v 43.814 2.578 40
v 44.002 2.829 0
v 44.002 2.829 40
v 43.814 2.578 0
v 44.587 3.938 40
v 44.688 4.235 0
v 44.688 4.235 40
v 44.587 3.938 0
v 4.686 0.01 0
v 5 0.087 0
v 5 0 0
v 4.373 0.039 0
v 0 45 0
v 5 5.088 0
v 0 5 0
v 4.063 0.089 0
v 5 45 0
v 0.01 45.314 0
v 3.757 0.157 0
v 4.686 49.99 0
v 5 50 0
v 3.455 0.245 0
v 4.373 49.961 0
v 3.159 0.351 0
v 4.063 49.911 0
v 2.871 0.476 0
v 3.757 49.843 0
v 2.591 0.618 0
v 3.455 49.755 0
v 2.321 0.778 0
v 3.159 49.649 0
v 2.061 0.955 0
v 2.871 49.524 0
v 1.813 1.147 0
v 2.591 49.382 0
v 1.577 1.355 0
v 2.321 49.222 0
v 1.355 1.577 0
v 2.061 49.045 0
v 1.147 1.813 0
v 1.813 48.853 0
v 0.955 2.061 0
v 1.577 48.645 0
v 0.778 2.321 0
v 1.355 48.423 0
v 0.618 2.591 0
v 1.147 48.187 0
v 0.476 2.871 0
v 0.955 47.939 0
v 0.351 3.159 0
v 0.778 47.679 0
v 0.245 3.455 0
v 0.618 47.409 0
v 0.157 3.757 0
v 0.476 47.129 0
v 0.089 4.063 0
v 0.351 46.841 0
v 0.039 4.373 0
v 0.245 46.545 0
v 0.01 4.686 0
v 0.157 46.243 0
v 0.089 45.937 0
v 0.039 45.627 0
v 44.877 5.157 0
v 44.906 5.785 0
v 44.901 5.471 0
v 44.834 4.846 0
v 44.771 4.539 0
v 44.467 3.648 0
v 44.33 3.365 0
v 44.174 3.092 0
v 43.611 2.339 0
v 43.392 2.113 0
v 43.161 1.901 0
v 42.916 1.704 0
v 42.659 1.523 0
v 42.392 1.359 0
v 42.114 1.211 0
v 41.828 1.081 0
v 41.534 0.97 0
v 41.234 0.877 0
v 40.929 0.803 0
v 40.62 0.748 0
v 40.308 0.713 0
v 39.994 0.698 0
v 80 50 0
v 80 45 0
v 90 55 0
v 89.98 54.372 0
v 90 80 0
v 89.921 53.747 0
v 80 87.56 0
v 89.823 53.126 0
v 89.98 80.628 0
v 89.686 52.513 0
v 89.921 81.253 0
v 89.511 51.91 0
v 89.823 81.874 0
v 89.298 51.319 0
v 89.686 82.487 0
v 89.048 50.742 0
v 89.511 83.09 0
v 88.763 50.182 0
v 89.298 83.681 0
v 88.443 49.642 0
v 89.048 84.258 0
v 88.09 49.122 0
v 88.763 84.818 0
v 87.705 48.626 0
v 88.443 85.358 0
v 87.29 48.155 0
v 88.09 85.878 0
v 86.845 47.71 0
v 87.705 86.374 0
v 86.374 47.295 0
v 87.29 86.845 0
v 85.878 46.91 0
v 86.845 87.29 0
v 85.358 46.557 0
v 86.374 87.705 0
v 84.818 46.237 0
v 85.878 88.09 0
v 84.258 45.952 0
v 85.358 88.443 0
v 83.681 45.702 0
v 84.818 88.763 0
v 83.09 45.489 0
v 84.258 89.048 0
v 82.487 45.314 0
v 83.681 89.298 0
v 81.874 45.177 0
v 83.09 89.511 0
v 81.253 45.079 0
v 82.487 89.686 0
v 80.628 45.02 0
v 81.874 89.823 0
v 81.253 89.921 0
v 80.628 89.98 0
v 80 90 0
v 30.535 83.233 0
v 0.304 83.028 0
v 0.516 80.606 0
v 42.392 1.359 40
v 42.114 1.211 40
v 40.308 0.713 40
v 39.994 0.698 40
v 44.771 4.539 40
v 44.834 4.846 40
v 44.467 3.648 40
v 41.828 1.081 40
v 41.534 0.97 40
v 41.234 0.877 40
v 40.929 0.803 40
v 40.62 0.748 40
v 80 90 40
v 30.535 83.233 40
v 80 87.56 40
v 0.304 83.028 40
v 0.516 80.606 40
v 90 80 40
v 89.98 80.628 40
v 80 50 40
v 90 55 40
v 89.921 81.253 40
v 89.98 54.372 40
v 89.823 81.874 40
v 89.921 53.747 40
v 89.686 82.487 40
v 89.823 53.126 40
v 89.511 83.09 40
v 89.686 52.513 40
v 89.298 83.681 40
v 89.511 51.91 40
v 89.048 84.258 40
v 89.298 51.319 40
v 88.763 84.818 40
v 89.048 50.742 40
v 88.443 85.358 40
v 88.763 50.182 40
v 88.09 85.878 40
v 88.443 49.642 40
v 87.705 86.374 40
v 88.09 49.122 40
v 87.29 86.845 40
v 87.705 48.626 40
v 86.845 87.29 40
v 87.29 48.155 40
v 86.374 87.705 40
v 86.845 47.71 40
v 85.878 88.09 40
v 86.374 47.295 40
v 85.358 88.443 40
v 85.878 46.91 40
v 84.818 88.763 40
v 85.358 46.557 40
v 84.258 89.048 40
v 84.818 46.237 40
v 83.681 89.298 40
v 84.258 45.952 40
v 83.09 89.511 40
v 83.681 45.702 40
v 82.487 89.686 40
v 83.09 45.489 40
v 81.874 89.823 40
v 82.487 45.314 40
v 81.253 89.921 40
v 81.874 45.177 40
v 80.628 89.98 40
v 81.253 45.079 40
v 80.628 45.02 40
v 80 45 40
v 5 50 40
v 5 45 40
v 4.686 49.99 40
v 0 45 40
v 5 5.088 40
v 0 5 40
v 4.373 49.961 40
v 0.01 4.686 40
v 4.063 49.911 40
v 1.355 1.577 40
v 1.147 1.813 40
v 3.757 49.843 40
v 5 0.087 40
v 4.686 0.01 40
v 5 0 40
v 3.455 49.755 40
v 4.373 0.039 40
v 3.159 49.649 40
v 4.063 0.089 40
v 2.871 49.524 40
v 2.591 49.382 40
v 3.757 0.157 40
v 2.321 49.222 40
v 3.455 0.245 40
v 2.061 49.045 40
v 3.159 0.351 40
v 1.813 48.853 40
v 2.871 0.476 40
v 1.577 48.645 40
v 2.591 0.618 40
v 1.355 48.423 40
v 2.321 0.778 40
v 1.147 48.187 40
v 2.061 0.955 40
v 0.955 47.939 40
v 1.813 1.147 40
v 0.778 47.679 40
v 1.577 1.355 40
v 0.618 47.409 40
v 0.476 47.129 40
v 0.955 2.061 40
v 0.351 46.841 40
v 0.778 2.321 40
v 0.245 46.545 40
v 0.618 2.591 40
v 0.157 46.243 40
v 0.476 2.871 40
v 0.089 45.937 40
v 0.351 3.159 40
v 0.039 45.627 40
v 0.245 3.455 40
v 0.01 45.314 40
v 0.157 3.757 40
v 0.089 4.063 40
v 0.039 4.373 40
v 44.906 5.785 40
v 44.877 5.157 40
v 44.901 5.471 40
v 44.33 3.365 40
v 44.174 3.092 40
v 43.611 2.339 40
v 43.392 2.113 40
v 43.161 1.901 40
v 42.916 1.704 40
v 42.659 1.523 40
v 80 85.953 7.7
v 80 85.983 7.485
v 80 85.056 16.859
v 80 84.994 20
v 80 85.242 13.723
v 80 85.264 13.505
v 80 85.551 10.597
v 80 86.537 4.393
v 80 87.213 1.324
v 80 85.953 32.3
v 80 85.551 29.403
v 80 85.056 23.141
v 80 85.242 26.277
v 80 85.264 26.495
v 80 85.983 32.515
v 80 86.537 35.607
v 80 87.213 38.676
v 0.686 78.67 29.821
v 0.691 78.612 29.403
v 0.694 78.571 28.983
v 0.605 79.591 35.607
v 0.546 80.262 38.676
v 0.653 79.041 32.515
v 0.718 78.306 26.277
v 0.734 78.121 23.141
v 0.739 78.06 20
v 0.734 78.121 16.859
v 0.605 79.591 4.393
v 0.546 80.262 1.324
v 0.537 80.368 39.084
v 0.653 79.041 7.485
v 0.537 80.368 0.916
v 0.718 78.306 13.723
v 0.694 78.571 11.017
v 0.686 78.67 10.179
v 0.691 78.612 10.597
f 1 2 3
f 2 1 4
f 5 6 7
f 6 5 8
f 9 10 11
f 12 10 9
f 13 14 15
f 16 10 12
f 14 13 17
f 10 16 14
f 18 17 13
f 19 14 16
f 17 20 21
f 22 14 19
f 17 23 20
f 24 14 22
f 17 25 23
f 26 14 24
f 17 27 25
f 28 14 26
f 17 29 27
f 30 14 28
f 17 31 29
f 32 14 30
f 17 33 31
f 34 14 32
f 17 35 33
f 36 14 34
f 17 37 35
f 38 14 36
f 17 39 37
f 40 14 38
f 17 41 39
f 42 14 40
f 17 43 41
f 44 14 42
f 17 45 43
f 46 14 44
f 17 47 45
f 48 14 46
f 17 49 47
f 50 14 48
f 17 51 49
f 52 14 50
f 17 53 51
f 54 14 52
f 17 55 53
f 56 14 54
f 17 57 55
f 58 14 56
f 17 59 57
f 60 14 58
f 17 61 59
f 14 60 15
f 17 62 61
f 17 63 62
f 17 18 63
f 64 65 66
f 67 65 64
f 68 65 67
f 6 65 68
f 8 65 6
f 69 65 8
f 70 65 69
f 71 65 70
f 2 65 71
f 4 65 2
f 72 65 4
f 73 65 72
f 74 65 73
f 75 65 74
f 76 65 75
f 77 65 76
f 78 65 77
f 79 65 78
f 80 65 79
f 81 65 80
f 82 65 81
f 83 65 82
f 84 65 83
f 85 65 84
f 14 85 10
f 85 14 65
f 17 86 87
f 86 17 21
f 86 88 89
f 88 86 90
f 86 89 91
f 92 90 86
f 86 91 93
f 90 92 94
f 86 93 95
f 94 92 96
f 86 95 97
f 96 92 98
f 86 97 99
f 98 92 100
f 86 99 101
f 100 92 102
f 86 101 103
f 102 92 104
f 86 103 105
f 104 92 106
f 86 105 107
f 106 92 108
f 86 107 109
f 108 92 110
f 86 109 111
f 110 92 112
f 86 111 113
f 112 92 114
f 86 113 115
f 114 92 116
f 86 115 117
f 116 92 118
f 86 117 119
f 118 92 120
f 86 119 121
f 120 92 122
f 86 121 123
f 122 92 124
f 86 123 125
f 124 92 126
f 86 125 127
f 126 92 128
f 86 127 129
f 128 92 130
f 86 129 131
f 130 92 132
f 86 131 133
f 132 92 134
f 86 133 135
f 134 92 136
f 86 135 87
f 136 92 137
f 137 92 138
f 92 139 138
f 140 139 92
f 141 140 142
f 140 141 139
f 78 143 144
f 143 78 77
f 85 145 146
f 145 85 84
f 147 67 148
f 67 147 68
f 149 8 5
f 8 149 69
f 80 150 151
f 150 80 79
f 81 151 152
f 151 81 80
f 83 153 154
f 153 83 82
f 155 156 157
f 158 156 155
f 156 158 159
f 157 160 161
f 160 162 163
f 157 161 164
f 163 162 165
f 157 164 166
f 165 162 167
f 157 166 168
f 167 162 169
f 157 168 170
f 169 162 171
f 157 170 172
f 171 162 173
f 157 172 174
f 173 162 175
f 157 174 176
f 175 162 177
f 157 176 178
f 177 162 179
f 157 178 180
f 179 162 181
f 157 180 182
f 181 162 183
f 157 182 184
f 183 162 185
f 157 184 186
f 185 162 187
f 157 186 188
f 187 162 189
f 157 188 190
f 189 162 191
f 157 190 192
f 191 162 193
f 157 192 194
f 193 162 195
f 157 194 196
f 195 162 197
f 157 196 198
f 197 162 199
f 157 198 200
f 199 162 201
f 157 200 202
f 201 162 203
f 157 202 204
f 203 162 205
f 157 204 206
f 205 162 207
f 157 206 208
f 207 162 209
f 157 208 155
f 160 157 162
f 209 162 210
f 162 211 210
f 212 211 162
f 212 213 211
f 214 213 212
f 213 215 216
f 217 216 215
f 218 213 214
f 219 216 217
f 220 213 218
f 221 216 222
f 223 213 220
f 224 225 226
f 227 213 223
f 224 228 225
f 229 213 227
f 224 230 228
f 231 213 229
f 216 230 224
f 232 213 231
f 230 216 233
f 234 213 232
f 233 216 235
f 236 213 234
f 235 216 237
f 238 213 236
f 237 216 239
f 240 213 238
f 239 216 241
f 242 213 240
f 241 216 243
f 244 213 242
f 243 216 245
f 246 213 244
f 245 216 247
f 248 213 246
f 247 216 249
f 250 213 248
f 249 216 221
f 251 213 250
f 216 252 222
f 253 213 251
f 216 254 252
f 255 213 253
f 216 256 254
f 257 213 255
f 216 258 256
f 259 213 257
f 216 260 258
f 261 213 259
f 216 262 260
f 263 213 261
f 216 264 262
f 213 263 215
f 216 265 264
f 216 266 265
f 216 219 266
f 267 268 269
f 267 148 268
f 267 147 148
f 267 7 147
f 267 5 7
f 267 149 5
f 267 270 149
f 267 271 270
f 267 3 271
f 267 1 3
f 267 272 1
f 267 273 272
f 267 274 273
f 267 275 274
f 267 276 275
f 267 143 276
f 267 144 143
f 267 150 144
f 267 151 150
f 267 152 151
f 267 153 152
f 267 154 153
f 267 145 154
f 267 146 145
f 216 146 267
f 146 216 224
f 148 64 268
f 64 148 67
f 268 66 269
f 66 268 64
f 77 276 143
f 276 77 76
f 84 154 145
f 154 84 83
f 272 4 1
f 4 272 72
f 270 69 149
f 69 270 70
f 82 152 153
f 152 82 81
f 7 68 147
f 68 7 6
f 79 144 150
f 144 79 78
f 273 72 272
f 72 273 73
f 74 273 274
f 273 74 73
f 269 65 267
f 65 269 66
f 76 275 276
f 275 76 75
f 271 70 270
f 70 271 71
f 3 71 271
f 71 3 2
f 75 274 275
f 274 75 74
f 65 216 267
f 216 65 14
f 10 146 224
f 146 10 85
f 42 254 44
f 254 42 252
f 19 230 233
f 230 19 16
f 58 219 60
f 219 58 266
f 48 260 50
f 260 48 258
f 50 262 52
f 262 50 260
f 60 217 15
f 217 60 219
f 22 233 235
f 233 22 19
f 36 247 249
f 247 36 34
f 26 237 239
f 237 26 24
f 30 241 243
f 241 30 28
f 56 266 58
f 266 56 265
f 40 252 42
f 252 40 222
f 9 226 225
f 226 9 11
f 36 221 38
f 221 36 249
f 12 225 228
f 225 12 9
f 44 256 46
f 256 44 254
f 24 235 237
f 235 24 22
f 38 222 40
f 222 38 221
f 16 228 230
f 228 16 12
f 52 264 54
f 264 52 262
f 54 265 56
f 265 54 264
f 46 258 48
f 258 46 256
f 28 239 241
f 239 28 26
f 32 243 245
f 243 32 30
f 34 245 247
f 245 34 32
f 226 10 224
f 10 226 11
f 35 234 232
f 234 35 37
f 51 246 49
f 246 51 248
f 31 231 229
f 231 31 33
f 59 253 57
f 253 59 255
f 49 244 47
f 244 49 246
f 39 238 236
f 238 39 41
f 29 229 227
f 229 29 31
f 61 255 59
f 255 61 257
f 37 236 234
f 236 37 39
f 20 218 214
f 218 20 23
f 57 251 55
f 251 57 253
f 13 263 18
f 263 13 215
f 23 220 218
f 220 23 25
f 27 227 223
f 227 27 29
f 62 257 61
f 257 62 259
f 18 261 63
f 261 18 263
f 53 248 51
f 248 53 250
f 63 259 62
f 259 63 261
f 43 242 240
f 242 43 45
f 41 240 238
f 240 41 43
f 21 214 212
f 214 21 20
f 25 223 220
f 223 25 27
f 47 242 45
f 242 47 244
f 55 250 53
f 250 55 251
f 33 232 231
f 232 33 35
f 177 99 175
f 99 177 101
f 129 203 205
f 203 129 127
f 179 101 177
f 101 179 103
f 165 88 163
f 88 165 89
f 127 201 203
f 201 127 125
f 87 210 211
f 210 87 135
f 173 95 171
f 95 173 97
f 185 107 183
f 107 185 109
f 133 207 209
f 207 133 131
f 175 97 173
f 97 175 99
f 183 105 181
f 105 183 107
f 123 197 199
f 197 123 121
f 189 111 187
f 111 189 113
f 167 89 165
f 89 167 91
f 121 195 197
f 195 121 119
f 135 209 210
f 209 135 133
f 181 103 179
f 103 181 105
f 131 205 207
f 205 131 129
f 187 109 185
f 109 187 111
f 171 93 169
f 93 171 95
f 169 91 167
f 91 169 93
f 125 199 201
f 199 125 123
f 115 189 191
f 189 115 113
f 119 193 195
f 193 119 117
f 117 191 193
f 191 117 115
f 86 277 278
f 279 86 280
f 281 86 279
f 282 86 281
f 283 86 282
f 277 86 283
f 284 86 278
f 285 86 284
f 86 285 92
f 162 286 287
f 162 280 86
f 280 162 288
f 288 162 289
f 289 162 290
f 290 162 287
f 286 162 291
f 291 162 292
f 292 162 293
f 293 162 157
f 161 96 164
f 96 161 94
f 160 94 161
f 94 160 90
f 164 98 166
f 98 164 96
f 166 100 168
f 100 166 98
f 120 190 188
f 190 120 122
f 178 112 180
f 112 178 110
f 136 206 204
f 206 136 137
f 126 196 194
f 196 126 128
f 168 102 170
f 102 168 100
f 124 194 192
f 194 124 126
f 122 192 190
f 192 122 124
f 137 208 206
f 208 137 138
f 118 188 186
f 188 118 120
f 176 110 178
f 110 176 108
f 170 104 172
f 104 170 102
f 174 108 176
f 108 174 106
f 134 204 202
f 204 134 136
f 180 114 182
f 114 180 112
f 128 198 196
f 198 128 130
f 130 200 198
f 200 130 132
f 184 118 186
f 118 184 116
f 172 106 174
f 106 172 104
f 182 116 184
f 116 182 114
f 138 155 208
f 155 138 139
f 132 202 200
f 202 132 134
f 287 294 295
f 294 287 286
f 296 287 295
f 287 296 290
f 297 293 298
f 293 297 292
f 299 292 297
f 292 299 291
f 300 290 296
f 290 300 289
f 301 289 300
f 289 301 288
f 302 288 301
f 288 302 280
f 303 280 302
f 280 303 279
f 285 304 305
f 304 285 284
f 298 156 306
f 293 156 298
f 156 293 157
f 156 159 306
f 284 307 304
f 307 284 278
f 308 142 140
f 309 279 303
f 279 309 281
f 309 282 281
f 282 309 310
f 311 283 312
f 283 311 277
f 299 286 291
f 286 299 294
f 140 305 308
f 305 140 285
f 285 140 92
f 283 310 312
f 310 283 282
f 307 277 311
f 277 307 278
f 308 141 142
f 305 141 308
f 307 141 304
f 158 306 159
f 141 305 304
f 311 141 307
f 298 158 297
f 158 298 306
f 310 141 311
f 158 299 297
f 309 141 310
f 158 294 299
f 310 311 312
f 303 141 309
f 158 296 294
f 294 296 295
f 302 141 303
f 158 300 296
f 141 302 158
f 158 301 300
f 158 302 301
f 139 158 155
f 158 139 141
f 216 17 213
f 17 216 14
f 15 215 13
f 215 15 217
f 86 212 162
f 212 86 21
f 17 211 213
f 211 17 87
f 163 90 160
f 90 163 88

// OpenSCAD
//How thick is your Desk (in mm)?
thickness_of_desk = 40;
//How wide should the Headphoneholder be (in mm)?
width = 40;//[10:80]
//How thick is the Headband of your Headset?
thickness_of_headset = 30;


rha = width*2; //Radius Headset Auflage

//Tischklemme+Rundung
rotate([0,0,1]){
    translate([5,0,0]){
    cube([35,5,width]);
        translate([35,5,0]){
            intersection(){
                cylinder(width,5,5,$fn=100);
                translate([0,-5,0]){
                    cube([5,5,width]);
                }
            }
        }
    }
}

//Rundung Ecke Tischklemme/thickness_of_desknabstand
translate([5,5,0]){
    intersection(){
        cylinder(width,5,5,$fn=100);
        translate([-5,-5,0]){
            cube([5,5,width]);
        }
    }
}

//thickness_of_desknabstand
translate([0,5,0]){
    cube([5,thickness_of_desk,width]);
}

//Rundung Ecke thickness_of_desknabstand/langes Ding
translate([5,thickness_of_desk+5,0]){
    intersection(){
        cylinder(width,5,5,$fn=100);
        translate([-5,0,0]){
            cube([5,5,width]);
        }
    }
}

//Langes Ding
translate([5,5+thickness_of_desk,0]){
    cube([75,5,width]);
}

//Rundung langes Ding/Headsetabstand
translate([80,15+thickness_of_desk,0]){
    intersection(){
        cylinder(width,10,10,$fn=100);
        translate([0,-10,0]){
            cube([10,10,width]);
        }
    }
}

//Headset abstand
translate([80,15+thickness_of_desk,0]){
    cube([10,thickness_of_headset-5,width]);
}

//Rundung Headsetabstand/auflage
translate([80,thickness_of_headset+10+thickness_of_desk,0]){
    intersection(){
        cylinder(width,10,10,$fn=100);
        translate([0,0,0]){
            cube([10,10,width]);
        }
    }
}

//Headset Auflage 4,5DEG
translate([80,thickness_of_headset+20+thickness_of_desk,0]){
    intersection(){
        translate([0,rha-4.7,width/2]){
            rotate([0,-90,5]){
                cylinder(100,rha,rha,$fn=rha*2);
            }
        }
        rotate([0,0,185]){
            cube([80,5,width]);
        }
    }
}
